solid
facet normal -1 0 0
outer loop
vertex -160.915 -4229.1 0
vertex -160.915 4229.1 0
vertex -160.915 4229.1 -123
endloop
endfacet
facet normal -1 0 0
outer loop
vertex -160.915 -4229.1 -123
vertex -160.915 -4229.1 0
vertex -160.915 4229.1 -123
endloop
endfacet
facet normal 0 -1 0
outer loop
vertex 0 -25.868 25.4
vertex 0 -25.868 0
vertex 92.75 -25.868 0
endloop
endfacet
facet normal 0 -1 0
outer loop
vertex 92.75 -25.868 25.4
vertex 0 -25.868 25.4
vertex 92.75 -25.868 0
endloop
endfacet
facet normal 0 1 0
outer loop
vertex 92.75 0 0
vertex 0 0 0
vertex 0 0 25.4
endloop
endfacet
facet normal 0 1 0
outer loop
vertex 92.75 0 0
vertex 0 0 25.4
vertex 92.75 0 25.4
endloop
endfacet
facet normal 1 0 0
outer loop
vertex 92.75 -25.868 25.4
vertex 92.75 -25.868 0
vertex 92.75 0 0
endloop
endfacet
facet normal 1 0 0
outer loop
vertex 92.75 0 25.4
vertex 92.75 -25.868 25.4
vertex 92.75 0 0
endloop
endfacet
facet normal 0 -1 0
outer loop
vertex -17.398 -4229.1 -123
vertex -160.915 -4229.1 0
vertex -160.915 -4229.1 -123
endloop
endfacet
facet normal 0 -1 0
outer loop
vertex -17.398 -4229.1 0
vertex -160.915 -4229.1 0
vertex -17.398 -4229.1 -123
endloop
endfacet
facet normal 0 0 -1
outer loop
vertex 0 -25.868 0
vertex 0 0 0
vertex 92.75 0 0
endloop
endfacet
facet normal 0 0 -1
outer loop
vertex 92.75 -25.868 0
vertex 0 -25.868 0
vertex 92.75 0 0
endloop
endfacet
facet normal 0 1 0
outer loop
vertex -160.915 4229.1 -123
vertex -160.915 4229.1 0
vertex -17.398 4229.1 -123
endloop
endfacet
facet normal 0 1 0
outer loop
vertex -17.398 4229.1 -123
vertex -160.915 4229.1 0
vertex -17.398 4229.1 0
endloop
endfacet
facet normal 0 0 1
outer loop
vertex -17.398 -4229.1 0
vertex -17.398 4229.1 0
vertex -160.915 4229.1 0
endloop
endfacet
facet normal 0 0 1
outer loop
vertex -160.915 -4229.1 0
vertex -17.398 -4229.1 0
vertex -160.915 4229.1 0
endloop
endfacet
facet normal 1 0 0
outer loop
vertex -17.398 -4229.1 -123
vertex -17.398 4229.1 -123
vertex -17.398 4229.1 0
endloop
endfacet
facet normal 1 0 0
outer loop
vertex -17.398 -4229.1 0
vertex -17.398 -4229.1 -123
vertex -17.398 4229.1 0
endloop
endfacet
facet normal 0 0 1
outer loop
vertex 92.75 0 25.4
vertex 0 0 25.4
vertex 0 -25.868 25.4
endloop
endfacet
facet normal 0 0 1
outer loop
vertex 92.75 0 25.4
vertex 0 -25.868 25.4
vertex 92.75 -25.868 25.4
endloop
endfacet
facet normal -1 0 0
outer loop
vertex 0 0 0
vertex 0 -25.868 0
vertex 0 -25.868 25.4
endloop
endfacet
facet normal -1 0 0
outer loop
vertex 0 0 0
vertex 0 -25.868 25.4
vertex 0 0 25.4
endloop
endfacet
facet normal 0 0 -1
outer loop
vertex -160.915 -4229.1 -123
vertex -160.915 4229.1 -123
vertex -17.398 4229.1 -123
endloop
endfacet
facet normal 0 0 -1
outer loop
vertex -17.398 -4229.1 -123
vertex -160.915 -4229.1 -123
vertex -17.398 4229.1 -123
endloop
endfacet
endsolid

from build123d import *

# Parameters (mm, degrees)
F1_DEPTH = 4229.1
F2_W     = 92.750423
F2_H     = 25.867587
F3_DEPTH = 25.4


with BuildPart() as f1:
    # F0 (on Front) → F1 (new body, symmetric)
    with BuildSketch(Plane.XZ):
        with BuildLine():
            Line((-17.3975, -123), (-17.3975, 0))
            add(Edge.make_bspline(
                [(-17.3975, 0), (-45.15033, 0), (-105.06282, 0), (-160.915077, 0)],
                knots=[34.009572, 34.009572, 34.009572, 34.009572, 153.043664, 153.043664, 153.043664, 153.043664], degree=3))
            Line((-160.915077, 0), (-160.915077, -123))
            Line((-160.915077, -123), (-17.3975, -123))
        make_face()
    extrude(amount=F1_DEPTH, both=True)


with BuildPart() as f3:
    # F2 (on Top) → F3 (new body)
    with BuildSketch(Plane.XY):
        with Locations((46.375211, -12.933794)):
            Rectangle(F2_W, F2_H)
    extrude(amount=F3_DEPTH)


solid = Compound([f1.part, f3.part])
